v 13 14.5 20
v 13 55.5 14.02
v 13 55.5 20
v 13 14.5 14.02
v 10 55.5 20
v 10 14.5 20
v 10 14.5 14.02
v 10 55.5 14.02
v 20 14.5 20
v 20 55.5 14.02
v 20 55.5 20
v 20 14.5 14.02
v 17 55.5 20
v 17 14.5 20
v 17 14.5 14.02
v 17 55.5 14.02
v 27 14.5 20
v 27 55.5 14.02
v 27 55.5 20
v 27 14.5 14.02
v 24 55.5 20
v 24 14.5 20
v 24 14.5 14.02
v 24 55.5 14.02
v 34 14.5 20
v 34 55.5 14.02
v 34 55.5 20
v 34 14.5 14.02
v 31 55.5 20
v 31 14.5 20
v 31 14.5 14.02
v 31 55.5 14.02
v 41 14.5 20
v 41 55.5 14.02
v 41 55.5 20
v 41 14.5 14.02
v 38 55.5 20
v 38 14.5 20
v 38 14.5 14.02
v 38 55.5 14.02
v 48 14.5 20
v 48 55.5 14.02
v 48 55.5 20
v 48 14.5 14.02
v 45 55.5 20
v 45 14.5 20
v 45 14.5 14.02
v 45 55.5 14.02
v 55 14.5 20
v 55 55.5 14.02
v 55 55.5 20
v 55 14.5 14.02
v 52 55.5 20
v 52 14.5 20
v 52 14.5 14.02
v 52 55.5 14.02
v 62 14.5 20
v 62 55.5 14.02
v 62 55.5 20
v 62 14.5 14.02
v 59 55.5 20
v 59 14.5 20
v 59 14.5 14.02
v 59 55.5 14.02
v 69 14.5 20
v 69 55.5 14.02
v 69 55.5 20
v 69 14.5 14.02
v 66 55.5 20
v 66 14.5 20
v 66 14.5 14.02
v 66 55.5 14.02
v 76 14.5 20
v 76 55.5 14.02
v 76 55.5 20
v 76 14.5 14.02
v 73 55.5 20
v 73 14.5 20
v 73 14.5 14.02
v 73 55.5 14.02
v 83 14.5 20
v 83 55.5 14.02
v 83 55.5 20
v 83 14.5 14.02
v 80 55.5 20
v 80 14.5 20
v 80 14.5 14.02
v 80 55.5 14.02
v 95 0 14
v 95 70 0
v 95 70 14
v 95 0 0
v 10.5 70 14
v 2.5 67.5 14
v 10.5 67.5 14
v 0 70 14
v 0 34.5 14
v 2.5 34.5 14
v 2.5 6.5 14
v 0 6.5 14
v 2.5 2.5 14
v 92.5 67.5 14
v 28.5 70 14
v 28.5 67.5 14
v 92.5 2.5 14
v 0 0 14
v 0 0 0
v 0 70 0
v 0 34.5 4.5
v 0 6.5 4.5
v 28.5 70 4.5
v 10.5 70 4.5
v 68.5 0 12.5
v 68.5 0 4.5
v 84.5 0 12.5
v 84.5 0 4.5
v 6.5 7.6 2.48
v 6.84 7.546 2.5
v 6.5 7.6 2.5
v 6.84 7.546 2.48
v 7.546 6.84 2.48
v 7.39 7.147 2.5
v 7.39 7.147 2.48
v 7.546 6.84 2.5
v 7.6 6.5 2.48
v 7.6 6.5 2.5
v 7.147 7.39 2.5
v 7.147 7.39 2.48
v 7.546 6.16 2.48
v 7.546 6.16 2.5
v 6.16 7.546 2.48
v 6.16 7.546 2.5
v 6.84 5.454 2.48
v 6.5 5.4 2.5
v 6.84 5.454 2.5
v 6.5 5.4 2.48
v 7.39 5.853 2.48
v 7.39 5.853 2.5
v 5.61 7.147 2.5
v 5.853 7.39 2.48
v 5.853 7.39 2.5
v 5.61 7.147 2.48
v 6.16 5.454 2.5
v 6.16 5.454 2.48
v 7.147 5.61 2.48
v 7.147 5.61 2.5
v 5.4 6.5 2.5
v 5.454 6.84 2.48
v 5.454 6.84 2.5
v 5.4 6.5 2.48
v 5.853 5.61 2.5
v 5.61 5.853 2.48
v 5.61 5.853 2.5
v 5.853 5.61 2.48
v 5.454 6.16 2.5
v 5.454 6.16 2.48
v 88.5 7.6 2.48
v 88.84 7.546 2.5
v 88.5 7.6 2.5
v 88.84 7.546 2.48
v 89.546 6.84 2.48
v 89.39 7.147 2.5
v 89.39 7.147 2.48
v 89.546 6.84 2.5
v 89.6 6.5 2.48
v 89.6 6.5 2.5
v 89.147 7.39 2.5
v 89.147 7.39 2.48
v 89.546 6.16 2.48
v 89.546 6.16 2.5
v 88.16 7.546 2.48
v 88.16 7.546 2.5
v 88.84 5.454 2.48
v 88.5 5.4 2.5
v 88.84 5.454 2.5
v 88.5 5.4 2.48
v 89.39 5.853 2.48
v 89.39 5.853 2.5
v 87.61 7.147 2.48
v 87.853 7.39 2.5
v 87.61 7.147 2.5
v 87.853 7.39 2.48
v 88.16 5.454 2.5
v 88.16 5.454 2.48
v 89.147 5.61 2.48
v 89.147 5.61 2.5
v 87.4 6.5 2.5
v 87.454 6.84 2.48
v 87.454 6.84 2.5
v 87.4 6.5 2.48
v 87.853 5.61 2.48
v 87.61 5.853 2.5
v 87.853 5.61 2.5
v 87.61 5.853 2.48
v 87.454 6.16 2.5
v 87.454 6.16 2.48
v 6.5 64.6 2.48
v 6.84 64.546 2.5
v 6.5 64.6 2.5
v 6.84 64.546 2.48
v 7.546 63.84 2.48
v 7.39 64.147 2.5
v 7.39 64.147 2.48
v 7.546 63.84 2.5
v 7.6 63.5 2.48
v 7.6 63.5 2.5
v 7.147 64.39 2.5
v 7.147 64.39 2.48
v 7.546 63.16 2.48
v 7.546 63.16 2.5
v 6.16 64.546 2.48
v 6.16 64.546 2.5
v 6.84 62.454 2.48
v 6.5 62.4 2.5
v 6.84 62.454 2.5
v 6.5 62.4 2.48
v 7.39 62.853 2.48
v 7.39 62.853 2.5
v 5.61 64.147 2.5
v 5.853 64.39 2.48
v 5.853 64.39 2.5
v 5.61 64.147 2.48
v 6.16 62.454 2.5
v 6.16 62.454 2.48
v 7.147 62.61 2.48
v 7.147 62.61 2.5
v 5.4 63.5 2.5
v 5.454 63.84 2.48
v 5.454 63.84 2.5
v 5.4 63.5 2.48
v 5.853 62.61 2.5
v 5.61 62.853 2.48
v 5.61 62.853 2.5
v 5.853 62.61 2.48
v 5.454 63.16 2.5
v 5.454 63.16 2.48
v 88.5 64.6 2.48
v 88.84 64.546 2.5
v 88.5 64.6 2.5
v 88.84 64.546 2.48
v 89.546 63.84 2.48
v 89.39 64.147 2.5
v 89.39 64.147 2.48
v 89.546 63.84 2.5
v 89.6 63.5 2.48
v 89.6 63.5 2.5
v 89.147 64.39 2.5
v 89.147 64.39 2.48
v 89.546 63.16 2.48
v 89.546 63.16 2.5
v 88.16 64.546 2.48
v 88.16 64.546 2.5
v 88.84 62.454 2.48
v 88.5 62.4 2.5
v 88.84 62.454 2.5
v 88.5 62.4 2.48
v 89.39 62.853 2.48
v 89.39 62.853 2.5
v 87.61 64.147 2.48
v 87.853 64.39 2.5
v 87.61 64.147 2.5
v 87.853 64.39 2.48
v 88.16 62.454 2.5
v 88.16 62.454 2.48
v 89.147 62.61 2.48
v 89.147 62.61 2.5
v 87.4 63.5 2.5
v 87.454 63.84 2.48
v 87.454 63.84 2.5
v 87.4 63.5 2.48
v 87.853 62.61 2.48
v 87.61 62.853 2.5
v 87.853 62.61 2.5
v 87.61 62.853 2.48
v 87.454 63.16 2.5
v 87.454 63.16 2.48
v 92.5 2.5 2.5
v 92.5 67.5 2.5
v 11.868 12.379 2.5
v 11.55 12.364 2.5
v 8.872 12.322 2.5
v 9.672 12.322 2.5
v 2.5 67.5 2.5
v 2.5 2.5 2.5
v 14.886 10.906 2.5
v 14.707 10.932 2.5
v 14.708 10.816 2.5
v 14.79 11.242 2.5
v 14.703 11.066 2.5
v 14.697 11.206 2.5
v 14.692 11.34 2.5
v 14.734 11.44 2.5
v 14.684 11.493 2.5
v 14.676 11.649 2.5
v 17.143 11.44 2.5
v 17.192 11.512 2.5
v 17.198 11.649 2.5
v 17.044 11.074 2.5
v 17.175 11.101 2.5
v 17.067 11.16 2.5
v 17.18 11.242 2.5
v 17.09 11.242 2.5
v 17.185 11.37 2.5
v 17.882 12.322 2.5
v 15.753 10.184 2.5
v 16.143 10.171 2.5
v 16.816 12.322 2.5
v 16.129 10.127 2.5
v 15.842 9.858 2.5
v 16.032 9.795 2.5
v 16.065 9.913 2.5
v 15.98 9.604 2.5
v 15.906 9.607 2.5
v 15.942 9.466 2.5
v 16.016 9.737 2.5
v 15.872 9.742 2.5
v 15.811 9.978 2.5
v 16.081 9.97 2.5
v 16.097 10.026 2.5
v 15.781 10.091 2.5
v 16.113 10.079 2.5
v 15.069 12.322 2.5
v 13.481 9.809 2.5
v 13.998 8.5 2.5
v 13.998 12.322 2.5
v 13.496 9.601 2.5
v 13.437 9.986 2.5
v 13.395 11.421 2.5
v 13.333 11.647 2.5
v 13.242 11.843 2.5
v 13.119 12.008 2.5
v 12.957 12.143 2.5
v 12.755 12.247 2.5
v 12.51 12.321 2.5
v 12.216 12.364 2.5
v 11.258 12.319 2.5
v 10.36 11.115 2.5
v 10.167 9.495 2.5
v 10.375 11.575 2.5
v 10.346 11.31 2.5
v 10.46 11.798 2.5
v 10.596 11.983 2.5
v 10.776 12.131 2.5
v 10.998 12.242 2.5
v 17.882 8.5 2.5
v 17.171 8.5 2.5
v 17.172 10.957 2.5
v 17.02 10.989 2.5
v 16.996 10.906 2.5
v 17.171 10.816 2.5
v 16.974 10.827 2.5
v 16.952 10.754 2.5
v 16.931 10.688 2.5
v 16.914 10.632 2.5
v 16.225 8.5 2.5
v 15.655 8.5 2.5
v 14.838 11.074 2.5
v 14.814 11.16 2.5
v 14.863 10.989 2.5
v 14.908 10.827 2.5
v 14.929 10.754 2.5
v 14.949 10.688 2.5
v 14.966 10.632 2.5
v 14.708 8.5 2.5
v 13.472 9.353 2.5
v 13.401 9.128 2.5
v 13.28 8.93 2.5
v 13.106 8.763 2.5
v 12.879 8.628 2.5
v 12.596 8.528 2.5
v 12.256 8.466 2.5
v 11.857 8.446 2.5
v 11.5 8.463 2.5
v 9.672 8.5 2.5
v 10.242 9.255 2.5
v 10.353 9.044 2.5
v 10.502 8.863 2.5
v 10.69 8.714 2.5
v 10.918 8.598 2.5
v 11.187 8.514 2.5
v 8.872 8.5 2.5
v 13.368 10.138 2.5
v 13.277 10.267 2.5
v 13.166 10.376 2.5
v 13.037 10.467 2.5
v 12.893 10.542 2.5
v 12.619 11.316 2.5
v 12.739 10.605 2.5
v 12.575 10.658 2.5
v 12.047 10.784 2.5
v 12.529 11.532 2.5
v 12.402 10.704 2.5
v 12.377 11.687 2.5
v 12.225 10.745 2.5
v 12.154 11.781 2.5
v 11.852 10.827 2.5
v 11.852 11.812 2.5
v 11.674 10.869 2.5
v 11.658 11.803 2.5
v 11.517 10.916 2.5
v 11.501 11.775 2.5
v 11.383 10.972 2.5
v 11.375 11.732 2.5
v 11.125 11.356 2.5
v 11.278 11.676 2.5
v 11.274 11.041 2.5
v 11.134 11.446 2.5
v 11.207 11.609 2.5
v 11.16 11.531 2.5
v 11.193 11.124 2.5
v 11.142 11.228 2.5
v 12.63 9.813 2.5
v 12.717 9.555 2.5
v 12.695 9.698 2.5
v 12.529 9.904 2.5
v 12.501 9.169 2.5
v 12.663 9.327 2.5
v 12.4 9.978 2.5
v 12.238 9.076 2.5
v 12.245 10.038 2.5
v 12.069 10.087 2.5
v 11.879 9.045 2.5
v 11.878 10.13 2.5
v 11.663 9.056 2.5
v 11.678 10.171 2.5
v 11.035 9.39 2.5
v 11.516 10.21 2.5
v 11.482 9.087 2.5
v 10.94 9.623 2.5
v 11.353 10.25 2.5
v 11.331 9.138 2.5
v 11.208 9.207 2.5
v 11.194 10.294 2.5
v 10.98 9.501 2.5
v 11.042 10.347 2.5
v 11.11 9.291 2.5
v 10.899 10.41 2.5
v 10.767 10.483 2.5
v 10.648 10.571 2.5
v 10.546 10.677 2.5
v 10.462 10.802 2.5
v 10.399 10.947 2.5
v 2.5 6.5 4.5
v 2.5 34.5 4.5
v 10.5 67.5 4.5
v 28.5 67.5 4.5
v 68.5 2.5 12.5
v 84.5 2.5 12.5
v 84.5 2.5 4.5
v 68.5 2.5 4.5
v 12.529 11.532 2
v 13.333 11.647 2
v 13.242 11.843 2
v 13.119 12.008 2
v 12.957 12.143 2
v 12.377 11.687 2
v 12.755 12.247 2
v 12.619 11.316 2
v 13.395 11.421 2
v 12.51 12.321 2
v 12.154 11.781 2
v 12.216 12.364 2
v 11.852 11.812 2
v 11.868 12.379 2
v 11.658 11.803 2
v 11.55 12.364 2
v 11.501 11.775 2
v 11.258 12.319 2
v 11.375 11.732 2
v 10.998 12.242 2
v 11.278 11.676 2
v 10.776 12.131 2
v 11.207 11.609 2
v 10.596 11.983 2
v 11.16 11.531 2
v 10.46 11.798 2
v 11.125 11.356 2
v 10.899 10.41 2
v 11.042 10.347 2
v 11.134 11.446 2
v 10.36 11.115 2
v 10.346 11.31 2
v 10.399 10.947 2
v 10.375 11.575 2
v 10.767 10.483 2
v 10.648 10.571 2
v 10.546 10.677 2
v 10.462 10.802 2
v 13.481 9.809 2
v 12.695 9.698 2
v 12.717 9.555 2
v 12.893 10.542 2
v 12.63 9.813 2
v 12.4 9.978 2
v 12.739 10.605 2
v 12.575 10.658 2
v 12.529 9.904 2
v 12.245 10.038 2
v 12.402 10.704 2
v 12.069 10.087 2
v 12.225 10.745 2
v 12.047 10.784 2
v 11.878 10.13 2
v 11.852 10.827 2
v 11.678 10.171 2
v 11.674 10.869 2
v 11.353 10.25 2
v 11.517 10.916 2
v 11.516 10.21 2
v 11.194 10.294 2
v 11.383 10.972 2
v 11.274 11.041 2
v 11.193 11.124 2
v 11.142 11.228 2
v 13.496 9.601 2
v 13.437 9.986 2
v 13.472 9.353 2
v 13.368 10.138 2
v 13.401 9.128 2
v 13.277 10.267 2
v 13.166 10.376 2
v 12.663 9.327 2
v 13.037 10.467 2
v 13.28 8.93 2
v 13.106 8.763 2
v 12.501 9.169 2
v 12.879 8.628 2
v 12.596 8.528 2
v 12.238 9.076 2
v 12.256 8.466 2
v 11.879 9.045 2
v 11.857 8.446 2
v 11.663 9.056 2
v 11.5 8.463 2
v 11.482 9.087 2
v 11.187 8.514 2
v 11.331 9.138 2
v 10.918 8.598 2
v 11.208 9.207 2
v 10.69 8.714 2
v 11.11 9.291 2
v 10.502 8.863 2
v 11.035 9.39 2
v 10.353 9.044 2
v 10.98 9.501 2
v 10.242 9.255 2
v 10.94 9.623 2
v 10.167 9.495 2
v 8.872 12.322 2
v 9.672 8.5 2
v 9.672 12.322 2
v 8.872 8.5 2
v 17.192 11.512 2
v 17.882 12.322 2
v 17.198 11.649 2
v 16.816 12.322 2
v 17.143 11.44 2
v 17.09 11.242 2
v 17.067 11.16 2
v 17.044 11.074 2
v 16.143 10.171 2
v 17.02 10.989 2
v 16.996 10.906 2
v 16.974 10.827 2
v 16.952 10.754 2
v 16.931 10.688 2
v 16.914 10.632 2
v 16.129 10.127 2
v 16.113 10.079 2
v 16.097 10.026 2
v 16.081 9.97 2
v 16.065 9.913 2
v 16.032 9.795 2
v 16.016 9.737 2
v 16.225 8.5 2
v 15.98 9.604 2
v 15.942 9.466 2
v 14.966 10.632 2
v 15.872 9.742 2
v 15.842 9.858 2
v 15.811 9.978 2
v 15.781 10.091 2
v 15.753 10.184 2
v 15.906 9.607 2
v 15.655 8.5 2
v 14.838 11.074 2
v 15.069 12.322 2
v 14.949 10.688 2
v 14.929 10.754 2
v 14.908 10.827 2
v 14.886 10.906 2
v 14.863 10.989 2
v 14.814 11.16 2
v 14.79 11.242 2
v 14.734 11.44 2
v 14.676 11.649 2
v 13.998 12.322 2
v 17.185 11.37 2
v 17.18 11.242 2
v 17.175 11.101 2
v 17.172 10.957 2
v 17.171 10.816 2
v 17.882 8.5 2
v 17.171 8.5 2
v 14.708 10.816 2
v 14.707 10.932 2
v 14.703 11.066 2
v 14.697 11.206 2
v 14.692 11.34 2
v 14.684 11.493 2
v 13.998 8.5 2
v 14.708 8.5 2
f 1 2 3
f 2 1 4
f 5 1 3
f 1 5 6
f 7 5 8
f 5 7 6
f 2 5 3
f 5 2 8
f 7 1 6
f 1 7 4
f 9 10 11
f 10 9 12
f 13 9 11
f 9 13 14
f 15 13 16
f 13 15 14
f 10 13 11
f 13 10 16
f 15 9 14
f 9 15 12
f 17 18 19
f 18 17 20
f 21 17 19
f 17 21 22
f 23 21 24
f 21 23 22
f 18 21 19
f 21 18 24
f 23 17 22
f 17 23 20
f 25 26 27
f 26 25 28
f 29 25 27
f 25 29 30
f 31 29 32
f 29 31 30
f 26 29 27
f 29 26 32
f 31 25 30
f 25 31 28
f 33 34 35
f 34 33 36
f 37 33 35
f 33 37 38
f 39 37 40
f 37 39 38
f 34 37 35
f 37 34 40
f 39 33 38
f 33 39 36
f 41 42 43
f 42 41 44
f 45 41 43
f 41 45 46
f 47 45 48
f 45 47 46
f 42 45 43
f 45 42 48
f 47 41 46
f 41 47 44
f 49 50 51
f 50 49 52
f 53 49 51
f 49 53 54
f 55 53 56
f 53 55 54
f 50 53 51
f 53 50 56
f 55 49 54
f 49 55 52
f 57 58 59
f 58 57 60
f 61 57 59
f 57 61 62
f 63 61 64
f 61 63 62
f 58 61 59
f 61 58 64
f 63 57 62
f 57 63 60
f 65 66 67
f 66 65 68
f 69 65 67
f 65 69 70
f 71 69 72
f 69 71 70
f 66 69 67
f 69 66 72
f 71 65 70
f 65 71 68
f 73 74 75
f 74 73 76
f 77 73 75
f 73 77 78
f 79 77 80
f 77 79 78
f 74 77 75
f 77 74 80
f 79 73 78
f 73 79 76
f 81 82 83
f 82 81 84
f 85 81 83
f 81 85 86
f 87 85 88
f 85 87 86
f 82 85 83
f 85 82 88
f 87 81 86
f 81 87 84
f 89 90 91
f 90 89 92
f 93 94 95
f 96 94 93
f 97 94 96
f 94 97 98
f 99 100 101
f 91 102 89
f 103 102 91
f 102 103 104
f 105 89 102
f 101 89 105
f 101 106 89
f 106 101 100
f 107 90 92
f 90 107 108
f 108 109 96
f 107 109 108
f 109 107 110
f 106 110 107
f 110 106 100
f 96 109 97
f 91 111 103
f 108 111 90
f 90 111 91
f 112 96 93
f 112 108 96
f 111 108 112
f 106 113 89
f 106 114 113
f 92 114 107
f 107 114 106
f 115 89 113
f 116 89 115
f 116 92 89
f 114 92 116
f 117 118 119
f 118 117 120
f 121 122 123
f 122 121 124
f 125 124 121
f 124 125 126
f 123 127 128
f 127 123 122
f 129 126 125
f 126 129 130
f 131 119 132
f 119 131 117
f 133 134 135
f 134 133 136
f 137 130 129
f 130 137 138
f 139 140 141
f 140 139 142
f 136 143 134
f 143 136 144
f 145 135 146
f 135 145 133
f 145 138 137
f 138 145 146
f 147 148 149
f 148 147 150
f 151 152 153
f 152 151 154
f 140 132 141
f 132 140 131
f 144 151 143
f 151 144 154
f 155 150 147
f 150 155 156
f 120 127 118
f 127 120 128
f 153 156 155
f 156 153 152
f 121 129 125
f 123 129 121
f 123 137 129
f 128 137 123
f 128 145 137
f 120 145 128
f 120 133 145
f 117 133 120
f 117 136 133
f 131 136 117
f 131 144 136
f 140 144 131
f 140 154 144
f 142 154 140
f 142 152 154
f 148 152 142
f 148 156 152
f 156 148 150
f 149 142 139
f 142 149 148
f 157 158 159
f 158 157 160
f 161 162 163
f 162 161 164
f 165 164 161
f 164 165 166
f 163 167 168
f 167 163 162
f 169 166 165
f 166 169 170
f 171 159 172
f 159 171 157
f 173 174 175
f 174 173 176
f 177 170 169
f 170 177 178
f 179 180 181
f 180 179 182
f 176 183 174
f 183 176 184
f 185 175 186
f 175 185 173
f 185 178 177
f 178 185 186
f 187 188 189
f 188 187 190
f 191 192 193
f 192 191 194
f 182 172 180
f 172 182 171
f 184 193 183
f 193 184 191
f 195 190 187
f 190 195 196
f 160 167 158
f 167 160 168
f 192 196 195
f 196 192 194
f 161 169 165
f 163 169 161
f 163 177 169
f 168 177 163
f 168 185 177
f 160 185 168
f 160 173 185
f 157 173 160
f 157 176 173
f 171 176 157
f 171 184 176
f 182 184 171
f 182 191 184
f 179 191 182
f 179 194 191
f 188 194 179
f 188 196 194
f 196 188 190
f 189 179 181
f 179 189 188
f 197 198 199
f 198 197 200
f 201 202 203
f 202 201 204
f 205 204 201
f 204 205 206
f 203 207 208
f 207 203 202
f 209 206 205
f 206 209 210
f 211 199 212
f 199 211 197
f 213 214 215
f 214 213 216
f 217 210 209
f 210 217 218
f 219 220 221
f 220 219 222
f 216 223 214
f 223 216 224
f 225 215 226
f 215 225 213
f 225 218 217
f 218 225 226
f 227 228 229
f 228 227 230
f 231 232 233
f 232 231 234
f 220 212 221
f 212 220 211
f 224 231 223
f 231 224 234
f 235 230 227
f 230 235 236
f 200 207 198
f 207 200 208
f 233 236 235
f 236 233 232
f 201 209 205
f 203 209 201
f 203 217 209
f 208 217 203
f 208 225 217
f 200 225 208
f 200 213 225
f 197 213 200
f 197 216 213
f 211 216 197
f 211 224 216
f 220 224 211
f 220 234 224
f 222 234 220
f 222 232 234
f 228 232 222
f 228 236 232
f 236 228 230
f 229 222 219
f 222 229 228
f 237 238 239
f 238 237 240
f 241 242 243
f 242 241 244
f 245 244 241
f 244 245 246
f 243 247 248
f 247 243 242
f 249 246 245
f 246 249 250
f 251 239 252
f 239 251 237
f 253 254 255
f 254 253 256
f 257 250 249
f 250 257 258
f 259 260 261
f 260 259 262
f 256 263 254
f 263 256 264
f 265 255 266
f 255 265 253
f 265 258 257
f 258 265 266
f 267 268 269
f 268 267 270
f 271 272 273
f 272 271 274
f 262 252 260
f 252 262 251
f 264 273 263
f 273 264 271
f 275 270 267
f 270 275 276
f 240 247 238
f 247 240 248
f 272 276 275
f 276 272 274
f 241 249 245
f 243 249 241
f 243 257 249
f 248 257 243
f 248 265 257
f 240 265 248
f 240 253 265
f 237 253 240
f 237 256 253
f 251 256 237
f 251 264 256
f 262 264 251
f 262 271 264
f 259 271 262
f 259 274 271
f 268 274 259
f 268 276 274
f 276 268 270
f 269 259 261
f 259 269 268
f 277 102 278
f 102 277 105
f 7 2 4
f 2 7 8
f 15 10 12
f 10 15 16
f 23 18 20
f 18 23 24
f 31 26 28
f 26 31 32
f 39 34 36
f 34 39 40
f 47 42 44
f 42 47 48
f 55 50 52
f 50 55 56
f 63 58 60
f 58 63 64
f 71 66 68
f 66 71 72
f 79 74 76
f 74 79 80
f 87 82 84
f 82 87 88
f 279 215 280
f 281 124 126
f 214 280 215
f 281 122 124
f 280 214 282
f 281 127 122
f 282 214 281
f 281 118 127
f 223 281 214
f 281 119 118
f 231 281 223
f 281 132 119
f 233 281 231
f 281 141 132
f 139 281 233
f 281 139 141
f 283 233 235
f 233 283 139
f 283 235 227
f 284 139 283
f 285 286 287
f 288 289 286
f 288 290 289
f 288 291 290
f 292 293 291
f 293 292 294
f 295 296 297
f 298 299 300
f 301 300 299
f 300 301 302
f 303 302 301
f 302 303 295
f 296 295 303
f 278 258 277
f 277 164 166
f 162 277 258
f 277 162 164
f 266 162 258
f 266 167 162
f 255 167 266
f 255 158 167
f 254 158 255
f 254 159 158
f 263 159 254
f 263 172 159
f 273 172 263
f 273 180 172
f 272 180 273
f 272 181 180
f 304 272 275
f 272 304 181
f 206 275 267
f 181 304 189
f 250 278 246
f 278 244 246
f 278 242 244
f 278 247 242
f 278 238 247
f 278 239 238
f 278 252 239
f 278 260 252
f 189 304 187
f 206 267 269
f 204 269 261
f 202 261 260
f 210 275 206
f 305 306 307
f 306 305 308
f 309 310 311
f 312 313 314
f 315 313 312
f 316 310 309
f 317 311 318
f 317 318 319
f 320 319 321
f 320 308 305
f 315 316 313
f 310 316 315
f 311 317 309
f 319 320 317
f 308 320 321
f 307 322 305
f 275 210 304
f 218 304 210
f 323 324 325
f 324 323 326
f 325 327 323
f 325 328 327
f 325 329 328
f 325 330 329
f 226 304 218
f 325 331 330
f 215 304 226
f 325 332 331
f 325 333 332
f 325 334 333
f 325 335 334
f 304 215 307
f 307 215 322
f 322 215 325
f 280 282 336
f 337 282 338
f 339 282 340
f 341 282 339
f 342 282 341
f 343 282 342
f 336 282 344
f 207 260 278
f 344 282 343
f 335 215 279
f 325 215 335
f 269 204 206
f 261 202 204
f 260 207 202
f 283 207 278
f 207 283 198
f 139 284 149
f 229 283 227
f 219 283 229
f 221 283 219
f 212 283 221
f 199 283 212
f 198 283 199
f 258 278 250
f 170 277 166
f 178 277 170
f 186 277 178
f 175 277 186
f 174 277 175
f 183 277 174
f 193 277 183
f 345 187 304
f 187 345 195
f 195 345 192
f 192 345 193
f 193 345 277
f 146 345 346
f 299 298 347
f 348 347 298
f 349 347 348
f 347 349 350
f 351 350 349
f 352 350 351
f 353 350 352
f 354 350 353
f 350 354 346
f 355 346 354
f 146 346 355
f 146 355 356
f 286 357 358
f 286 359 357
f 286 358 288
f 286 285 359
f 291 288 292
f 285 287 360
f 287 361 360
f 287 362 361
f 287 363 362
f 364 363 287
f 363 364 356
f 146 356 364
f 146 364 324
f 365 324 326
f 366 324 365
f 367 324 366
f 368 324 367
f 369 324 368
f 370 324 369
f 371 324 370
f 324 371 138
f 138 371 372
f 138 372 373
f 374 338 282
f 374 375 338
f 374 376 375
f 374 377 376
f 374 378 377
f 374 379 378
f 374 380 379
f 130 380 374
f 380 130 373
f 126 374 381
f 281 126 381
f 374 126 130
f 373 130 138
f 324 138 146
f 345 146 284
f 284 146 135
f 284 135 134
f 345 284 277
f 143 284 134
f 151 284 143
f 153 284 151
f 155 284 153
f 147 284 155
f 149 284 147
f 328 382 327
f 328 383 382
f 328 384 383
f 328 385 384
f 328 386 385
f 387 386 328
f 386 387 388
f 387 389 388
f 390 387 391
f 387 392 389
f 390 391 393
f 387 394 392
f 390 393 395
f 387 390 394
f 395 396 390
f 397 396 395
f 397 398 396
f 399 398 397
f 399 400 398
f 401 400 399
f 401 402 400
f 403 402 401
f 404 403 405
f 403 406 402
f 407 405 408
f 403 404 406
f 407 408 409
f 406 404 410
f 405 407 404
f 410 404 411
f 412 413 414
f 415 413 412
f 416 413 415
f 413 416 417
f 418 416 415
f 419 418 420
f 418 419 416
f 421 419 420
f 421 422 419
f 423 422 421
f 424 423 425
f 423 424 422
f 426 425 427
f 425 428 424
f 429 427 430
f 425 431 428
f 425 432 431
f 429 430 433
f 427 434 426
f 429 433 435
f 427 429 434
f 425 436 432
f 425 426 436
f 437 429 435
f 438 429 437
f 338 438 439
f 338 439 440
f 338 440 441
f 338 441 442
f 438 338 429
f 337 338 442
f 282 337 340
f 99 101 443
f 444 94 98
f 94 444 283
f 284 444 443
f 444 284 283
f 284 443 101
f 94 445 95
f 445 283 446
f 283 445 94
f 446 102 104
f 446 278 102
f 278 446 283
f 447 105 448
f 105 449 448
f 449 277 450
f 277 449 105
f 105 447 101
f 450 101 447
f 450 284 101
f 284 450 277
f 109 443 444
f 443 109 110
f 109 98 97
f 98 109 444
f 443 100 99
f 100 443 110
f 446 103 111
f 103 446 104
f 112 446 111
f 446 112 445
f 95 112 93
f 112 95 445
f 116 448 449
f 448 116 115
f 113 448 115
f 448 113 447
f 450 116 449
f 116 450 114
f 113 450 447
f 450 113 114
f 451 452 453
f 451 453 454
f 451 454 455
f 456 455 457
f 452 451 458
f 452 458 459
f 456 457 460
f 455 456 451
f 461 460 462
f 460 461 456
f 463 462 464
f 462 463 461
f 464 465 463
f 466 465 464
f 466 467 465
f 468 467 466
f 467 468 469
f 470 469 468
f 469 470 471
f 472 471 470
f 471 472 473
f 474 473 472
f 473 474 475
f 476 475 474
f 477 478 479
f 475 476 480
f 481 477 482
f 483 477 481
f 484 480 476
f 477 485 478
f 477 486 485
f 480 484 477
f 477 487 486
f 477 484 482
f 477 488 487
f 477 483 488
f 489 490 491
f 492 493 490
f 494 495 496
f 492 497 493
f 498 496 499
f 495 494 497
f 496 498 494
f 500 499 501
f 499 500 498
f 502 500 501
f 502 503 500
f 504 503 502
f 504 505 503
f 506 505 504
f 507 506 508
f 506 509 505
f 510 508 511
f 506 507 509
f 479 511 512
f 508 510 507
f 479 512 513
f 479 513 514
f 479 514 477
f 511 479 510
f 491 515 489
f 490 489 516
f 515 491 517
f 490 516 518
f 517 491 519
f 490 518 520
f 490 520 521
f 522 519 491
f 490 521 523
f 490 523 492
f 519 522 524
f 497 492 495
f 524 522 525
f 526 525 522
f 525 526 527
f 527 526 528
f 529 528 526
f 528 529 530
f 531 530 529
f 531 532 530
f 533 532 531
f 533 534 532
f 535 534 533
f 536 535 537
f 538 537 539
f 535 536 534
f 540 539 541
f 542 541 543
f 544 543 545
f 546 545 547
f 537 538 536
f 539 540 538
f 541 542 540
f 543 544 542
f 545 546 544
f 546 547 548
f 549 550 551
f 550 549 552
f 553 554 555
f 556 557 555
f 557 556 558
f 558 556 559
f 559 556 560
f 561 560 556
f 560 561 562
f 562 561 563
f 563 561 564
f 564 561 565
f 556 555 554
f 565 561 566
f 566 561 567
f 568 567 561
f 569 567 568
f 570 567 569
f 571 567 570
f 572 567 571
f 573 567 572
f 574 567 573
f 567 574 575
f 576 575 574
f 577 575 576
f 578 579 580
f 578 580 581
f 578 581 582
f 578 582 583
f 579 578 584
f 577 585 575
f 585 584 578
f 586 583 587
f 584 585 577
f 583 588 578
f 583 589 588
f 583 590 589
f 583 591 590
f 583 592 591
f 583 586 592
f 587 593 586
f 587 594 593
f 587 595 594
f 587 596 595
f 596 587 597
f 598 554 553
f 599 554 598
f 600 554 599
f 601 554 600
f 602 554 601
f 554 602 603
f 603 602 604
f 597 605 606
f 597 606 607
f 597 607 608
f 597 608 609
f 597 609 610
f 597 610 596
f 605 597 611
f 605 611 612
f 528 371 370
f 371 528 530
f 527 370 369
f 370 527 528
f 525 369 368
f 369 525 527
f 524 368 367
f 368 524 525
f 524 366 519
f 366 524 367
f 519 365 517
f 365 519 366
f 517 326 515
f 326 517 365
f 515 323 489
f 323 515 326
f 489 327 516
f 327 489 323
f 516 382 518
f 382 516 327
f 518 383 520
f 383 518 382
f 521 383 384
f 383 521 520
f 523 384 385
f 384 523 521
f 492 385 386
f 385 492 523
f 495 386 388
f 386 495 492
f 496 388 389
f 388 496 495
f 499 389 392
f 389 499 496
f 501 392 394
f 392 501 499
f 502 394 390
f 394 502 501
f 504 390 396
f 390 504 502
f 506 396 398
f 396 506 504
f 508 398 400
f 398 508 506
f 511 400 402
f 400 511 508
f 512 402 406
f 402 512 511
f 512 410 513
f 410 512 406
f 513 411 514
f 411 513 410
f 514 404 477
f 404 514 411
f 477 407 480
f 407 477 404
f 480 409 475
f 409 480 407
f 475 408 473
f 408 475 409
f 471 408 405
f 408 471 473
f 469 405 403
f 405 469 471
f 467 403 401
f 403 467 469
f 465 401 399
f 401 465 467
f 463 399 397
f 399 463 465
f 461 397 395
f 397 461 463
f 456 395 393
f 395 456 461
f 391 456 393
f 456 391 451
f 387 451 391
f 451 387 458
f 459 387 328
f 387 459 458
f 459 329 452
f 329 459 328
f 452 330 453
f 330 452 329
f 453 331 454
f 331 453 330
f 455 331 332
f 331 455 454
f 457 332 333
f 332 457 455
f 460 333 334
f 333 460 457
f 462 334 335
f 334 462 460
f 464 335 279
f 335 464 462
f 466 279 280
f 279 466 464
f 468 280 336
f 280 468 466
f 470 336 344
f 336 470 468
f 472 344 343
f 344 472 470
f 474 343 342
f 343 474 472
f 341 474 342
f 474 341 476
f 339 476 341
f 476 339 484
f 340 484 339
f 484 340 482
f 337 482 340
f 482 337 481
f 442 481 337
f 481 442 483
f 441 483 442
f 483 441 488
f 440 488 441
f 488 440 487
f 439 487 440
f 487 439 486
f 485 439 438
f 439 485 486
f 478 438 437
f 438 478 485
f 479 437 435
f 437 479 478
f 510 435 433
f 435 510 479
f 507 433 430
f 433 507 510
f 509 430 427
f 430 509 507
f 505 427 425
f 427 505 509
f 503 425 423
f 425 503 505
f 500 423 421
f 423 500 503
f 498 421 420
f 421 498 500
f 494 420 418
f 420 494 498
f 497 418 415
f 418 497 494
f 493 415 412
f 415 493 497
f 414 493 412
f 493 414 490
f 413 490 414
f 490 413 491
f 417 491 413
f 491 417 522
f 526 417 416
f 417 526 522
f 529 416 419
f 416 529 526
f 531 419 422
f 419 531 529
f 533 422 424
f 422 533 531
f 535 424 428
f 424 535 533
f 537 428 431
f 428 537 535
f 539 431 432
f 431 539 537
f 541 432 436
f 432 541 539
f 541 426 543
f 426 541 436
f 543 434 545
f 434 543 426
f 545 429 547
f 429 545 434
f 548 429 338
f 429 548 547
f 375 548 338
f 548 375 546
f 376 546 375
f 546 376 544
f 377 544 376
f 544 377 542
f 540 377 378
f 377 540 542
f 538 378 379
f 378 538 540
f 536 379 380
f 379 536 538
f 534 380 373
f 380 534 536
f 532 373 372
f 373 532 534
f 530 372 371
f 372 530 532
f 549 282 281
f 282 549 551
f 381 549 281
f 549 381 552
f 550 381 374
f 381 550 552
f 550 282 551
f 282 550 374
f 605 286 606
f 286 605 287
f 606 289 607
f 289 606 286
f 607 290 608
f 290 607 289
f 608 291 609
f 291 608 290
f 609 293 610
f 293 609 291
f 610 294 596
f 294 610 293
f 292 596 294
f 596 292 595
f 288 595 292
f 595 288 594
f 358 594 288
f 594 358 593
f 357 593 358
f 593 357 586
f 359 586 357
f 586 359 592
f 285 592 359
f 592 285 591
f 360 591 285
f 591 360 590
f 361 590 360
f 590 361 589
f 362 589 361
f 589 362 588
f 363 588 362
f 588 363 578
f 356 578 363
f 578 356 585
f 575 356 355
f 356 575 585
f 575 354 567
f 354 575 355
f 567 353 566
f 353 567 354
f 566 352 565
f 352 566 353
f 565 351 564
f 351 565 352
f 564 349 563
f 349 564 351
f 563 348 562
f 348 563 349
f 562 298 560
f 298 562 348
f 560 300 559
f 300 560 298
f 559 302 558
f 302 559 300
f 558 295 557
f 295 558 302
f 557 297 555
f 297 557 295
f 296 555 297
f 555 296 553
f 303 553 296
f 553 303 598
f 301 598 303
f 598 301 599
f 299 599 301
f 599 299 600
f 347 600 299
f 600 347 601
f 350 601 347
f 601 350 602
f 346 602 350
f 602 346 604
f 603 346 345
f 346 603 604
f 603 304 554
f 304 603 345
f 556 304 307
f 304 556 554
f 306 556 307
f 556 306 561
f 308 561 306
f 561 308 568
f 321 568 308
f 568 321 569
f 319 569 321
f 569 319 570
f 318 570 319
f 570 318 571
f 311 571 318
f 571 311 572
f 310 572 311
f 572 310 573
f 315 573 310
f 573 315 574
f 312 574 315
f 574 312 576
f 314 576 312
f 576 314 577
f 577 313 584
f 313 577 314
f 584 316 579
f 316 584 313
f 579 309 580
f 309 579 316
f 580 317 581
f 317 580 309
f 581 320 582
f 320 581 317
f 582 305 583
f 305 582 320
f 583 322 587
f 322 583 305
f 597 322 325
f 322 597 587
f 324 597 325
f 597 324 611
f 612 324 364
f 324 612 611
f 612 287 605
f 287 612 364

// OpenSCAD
// ISM Network Card bracket + cooler shroud (original ISM)
// Manifold-safe: bosses unioned into shell, holes cut in one difference().
pcb_w = 90;
pcb_d = 65;
wall = 2.5;
shroud_h = 14;
fin_h = 6;
eps = 0.02;
mount_d = 2.2;
badge_depth = 0.5;

mounts = [[4, 4], [pcb_w - 4, 4], [4, pcb_d - 4], [pcb_w - 4, pcb_d - 4]];

module shroud() {
  difference() {
    union() {
      cube([pcb_w + 2 * wall, pcb_d + 2 * wall, shroud_h]);
      for (x = [10 : 7 : pcb_w - 6])
        translate([x, wall + 12, shroud_h - eps])
          cube([3, pcb_d - 24, fin_h + eps]);
      for (p = mounts)
        translate([p[0] + wall, p[1] + wall, wall - eps])
          cylinder(h = 5 + eps, d = 6, $fn = 24);
    }
    translate([wall, wall, wall])
      cube([pcb_w, pcb_d, shroud_h - wall + eps]);
    // EXP header clearance
    translate([-eps, wall + 4, wall + 2])
      cube([wall + 4, 28, 10]);
    // RJ45 cutout
    translate([wall + 8, wall + pcb_d - 2, wall + 2])
      cube([18, wall + 4, 12]);
    // USB-C
    translate([wall + pcb_w - 24, -eps, wall + 2])
      cube([16, wall + 4, 8]);
    for (p = mounts)
      translate([p[0] + wall, p[1] + wall, wall - eps])
        cylinder(h = 8 + 2 * eps, d = mount_d, $fn = 20);
    translate([wall + 6, wall + 6, wall - badge_depth])
      linear_extrude(height = badge_depth + eps)
        text("ISM", size = 4, font = "Liberation Sans:style=Bold");
  }
}

module slot_bracket() {
  bw = 20;
  bh = 120;
  bt = 1.2;
  difference() {
    cube([bw, bt, bh]);
    translate([3, -eps, 18])
      cube([14, bt + 2 * eps, 16]);
    for (z = [8, bh - 8])
      translate([bw / 2, -eps, z])
        rotate([-90, 0, 0])
          cylinder(h = bt + 2 * eps, d = 3.2, $fn = 20);
  }
}

shroud();
